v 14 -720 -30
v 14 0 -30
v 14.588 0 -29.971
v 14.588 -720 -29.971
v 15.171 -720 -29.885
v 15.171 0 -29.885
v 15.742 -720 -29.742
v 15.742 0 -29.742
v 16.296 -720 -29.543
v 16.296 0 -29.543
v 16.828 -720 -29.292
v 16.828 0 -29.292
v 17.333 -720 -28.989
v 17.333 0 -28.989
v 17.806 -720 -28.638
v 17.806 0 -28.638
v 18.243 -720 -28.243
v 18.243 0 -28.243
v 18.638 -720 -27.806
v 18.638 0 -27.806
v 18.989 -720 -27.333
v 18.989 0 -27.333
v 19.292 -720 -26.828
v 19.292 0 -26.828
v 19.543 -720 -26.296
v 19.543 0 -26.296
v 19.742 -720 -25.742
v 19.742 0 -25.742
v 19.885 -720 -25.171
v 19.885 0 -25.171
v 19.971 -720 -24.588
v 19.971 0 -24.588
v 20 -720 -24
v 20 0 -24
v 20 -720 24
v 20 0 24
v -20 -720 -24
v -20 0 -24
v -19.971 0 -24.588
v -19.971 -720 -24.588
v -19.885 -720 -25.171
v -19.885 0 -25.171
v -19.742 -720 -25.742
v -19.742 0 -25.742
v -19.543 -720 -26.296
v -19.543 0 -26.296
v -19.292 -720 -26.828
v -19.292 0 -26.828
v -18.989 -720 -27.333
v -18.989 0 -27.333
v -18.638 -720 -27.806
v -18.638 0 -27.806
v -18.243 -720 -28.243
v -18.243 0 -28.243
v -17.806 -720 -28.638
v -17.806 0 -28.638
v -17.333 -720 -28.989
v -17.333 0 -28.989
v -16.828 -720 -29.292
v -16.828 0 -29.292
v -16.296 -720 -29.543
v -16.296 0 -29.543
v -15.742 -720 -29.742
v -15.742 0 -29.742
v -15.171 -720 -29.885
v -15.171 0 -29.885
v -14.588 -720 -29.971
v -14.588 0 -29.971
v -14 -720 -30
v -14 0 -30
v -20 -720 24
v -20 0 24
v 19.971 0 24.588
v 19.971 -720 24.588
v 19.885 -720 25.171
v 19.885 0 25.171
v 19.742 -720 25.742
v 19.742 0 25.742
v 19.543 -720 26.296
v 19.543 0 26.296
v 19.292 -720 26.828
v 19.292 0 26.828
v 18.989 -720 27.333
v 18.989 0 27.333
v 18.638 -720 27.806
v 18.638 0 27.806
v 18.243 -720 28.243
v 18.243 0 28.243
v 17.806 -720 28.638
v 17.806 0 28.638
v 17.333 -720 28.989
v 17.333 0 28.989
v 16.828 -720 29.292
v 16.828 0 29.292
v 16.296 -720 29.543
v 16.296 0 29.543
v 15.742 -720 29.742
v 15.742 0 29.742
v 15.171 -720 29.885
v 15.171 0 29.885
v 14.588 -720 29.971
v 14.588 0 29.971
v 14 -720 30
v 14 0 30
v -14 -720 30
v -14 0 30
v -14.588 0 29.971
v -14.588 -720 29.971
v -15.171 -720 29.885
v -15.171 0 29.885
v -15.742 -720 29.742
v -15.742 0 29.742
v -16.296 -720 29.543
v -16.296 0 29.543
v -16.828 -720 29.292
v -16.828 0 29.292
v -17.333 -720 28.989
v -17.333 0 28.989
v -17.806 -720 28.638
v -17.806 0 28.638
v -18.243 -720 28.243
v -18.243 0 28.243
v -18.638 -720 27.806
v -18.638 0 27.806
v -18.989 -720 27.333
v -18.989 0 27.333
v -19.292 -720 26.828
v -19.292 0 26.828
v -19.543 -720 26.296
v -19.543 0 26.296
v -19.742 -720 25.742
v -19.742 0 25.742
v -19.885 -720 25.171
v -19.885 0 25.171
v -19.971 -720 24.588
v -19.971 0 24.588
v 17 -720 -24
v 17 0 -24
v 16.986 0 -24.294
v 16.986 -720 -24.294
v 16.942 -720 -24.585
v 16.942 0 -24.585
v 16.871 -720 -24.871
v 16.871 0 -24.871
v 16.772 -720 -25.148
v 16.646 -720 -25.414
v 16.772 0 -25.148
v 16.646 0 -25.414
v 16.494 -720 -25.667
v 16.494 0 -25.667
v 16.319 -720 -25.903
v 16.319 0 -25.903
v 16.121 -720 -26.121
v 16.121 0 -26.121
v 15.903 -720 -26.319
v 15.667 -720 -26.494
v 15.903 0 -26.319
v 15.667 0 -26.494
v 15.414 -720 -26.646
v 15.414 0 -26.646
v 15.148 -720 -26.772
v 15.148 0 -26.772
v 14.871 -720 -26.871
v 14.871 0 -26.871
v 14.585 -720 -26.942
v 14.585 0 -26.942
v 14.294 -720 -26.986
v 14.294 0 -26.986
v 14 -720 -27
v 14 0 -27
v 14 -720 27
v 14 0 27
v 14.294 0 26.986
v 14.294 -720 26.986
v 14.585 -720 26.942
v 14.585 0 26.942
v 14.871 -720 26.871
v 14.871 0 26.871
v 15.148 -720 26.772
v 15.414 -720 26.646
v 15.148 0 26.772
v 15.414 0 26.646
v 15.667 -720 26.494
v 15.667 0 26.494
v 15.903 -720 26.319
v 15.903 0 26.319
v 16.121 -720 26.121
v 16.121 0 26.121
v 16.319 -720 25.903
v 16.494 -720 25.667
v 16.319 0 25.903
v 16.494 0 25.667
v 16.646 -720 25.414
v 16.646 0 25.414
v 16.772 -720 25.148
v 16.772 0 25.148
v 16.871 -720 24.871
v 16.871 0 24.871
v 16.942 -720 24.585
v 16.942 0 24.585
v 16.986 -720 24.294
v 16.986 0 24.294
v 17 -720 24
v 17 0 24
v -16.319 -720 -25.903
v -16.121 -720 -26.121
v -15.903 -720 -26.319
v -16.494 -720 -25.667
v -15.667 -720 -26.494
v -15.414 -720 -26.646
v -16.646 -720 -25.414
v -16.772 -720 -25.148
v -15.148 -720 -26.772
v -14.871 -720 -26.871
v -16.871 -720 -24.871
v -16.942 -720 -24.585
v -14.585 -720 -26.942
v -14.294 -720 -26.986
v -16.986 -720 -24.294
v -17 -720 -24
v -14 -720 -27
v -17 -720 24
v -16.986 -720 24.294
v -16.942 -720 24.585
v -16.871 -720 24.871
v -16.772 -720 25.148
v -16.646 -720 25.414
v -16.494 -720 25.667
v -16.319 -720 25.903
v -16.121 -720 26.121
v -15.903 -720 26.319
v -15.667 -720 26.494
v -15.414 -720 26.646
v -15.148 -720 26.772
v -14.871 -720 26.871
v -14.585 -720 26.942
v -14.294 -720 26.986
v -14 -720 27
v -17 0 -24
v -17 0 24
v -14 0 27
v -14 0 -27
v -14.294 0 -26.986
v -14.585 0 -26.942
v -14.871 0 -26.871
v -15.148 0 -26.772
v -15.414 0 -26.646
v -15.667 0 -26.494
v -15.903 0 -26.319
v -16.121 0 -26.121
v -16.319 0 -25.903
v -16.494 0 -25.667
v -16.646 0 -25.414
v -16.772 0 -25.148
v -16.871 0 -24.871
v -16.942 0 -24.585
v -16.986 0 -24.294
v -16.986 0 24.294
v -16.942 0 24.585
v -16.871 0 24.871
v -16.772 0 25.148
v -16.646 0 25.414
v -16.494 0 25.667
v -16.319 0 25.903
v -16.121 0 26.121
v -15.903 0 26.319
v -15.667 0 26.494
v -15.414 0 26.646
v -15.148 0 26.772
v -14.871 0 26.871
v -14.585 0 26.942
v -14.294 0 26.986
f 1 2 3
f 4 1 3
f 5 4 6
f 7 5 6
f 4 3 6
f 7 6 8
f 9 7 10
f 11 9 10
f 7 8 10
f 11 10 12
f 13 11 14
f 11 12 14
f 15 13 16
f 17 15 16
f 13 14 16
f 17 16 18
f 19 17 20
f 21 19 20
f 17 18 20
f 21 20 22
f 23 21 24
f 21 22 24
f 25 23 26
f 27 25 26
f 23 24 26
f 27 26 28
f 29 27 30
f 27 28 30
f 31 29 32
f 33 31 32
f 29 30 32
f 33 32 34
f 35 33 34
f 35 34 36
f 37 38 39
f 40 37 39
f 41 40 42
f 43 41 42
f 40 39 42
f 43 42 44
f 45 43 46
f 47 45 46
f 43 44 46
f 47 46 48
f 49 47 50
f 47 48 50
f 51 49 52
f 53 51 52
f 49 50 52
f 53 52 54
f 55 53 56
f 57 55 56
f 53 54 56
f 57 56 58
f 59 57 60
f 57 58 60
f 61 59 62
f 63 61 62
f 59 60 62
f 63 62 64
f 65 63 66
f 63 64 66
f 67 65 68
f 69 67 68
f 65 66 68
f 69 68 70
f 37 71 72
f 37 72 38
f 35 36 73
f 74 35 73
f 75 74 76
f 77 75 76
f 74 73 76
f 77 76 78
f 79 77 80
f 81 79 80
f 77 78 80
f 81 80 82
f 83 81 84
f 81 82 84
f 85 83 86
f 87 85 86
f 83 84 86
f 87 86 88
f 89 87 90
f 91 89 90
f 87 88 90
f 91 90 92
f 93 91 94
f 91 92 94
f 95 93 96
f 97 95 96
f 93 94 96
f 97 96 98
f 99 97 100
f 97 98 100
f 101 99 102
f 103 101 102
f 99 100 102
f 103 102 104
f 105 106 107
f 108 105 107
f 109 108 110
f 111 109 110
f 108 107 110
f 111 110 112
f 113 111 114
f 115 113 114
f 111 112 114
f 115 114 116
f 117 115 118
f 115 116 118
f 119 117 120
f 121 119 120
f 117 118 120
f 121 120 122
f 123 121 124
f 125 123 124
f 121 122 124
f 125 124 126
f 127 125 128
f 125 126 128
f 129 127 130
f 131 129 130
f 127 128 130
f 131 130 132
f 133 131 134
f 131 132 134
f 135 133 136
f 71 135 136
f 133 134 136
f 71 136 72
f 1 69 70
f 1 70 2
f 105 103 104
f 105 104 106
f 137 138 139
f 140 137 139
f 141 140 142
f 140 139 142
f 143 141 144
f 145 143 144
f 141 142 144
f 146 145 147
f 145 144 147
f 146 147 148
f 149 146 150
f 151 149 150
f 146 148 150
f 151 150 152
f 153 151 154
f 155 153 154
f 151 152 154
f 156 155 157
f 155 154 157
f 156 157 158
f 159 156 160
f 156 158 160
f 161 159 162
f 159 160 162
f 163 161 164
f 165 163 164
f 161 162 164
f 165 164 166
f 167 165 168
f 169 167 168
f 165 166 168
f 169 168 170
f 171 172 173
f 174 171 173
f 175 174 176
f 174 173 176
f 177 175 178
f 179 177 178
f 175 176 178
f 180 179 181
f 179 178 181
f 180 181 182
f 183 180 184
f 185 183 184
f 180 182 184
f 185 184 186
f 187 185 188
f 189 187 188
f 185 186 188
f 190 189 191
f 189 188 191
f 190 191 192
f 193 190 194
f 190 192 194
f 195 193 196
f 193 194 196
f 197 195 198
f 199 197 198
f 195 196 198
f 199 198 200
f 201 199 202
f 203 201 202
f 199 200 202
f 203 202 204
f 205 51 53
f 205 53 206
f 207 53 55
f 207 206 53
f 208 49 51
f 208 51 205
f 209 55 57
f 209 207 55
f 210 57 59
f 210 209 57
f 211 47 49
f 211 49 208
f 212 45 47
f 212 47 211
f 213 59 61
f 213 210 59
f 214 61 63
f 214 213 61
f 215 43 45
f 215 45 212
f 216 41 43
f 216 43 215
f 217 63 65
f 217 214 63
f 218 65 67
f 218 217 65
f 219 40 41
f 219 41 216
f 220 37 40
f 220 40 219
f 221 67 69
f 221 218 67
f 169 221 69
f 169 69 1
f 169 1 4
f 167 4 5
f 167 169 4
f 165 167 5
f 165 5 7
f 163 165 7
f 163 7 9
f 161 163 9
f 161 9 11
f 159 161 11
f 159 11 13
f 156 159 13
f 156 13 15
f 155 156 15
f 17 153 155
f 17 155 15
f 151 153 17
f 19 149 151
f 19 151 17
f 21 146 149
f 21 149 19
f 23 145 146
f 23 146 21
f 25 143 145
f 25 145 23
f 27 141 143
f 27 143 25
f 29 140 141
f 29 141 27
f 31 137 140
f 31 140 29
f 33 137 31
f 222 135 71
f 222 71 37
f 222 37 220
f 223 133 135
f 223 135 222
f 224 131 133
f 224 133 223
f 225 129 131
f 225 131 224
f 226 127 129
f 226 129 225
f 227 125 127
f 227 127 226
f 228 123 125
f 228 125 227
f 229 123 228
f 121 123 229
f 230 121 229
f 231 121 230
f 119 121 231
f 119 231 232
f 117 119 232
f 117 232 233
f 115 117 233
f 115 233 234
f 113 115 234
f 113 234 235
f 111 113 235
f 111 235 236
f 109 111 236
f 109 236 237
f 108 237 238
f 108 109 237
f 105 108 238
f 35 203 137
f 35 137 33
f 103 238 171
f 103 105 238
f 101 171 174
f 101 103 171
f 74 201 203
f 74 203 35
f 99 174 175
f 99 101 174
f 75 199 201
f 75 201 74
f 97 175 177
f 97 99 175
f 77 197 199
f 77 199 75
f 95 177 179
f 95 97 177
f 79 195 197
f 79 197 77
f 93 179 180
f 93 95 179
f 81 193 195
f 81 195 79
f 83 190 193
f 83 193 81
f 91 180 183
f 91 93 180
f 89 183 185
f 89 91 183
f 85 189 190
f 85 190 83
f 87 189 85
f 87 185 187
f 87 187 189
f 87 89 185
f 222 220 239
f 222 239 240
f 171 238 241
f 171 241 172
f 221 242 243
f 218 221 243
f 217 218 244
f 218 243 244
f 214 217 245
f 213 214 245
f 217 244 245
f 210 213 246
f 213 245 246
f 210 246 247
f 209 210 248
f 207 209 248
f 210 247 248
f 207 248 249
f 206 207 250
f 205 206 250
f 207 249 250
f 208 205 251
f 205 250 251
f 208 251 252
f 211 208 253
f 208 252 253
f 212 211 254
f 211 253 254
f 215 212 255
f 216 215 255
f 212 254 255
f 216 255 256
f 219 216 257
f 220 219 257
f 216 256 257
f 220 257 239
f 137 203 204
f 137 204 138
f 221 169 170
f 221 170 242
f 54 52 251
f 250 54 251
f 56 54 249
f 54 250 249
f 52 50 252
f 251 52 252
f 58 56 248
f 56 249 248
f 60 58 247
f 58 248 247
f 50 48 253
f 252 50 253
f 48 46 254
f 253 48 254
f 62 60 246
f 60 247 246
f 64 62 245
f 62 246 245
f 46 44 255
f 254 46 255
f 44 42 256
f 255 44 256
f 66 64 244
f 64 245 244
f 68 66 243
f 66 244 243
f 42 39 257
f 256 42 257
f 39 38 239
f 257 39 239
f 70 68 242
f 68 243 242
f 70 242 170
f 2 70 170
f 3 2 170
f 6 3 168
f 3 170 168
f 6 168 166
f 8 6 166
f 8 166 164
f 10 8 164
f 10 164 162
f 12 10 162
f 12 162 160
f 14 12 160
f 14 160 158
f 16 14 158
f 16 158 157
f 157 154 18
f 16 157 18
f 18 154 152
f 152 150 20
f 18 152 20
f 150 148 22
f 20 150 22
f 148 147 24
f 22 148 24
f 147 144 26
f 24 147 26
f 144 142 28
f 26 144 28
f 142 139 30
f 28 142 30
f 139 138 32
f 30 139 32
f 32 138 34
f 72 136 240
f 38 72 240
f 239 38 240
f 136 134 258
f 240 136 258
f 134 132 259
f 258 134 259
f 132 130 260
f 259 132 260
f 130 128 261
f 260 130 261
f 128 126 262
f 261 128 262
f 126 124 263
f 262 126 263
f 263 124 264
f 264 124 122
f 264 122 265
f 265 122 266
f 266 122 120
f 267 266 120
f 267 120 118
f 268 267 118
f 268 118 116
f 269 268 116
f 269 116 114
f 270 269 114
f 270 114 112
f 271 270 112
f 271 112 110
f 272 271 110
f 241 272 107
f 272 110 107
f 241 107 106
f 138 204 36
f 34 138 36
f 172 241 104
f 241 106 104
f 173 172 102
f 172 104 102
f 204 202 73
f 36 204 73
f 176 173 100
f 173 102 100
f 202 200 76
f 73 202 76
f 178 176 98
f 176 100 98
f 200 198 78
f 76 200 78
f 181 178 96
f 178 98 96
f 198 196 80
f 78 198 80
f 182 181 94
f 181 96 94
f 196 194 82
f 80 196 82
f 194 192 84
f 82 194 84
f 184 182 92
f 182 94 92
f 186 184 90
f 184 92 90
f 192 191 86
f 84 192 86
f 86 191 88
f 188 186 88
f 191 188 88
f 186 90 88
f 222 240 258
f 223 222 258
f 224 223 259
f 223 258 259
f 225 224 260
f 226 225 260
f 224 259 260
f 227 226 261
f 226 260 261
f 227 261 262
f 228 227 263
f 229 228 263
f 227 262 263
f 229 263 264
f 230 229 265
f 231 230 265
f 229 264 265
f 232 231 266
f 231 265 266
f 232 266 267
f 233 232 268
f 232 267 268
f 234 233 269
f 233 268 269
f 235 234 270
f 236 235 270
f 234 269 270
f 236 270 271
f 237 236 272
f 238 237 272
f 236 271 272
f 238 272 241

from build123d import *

# Parameters (mm, degrees)
F1_DEPTH = 720


with BuildPart() as f1:
    # F0 (on Front) → F1 (new body)
    with BuildSketch(Plane.XZ):
        with BuildLine():
            Line((14, 30), (-14, 30))
            ThreePointArc((-14, 30), (-18.242641, 28.242641), (-20, 24))
            Line((-20, 24), (-20, -24))
            ThreePointArc((-20, -24), (-18.242641, -28.242641), (-14, -30))
            Line((-14, -30), (14, -30))
            ThreePointArc((14, -30), (18.242641, -28.242641), (20, -24))
            Line((20, -24), (20, 24))
            ThreePointArc((20, 24), (18.242641, 28.242641), (14, 30))
        make_face()
        with BuildLine():
            Line((-17, -24), (-17, 24))
            ThreePointArc((-17, 24), (-16.12132, 26.12132), (-14, 27))
            Line((-14, 27), (14, 27))
            ThreePointArc((14, 27), (16.12132, 26.12132), (17, 24))
            Line((17, 24), (17, -24))
            ThreePointArc((17, -24), (16.12132, -26.12132), (14, -27))
            Line((14, -27), (-14, -27))
            ThreePointArc((-14, -27), (-16.12132, -26.12132), (-17, -24))
        make_face(mode=Mode.SUBTRACT)
    extrude(amount=F1_DEPTH)


solid = f1.part
